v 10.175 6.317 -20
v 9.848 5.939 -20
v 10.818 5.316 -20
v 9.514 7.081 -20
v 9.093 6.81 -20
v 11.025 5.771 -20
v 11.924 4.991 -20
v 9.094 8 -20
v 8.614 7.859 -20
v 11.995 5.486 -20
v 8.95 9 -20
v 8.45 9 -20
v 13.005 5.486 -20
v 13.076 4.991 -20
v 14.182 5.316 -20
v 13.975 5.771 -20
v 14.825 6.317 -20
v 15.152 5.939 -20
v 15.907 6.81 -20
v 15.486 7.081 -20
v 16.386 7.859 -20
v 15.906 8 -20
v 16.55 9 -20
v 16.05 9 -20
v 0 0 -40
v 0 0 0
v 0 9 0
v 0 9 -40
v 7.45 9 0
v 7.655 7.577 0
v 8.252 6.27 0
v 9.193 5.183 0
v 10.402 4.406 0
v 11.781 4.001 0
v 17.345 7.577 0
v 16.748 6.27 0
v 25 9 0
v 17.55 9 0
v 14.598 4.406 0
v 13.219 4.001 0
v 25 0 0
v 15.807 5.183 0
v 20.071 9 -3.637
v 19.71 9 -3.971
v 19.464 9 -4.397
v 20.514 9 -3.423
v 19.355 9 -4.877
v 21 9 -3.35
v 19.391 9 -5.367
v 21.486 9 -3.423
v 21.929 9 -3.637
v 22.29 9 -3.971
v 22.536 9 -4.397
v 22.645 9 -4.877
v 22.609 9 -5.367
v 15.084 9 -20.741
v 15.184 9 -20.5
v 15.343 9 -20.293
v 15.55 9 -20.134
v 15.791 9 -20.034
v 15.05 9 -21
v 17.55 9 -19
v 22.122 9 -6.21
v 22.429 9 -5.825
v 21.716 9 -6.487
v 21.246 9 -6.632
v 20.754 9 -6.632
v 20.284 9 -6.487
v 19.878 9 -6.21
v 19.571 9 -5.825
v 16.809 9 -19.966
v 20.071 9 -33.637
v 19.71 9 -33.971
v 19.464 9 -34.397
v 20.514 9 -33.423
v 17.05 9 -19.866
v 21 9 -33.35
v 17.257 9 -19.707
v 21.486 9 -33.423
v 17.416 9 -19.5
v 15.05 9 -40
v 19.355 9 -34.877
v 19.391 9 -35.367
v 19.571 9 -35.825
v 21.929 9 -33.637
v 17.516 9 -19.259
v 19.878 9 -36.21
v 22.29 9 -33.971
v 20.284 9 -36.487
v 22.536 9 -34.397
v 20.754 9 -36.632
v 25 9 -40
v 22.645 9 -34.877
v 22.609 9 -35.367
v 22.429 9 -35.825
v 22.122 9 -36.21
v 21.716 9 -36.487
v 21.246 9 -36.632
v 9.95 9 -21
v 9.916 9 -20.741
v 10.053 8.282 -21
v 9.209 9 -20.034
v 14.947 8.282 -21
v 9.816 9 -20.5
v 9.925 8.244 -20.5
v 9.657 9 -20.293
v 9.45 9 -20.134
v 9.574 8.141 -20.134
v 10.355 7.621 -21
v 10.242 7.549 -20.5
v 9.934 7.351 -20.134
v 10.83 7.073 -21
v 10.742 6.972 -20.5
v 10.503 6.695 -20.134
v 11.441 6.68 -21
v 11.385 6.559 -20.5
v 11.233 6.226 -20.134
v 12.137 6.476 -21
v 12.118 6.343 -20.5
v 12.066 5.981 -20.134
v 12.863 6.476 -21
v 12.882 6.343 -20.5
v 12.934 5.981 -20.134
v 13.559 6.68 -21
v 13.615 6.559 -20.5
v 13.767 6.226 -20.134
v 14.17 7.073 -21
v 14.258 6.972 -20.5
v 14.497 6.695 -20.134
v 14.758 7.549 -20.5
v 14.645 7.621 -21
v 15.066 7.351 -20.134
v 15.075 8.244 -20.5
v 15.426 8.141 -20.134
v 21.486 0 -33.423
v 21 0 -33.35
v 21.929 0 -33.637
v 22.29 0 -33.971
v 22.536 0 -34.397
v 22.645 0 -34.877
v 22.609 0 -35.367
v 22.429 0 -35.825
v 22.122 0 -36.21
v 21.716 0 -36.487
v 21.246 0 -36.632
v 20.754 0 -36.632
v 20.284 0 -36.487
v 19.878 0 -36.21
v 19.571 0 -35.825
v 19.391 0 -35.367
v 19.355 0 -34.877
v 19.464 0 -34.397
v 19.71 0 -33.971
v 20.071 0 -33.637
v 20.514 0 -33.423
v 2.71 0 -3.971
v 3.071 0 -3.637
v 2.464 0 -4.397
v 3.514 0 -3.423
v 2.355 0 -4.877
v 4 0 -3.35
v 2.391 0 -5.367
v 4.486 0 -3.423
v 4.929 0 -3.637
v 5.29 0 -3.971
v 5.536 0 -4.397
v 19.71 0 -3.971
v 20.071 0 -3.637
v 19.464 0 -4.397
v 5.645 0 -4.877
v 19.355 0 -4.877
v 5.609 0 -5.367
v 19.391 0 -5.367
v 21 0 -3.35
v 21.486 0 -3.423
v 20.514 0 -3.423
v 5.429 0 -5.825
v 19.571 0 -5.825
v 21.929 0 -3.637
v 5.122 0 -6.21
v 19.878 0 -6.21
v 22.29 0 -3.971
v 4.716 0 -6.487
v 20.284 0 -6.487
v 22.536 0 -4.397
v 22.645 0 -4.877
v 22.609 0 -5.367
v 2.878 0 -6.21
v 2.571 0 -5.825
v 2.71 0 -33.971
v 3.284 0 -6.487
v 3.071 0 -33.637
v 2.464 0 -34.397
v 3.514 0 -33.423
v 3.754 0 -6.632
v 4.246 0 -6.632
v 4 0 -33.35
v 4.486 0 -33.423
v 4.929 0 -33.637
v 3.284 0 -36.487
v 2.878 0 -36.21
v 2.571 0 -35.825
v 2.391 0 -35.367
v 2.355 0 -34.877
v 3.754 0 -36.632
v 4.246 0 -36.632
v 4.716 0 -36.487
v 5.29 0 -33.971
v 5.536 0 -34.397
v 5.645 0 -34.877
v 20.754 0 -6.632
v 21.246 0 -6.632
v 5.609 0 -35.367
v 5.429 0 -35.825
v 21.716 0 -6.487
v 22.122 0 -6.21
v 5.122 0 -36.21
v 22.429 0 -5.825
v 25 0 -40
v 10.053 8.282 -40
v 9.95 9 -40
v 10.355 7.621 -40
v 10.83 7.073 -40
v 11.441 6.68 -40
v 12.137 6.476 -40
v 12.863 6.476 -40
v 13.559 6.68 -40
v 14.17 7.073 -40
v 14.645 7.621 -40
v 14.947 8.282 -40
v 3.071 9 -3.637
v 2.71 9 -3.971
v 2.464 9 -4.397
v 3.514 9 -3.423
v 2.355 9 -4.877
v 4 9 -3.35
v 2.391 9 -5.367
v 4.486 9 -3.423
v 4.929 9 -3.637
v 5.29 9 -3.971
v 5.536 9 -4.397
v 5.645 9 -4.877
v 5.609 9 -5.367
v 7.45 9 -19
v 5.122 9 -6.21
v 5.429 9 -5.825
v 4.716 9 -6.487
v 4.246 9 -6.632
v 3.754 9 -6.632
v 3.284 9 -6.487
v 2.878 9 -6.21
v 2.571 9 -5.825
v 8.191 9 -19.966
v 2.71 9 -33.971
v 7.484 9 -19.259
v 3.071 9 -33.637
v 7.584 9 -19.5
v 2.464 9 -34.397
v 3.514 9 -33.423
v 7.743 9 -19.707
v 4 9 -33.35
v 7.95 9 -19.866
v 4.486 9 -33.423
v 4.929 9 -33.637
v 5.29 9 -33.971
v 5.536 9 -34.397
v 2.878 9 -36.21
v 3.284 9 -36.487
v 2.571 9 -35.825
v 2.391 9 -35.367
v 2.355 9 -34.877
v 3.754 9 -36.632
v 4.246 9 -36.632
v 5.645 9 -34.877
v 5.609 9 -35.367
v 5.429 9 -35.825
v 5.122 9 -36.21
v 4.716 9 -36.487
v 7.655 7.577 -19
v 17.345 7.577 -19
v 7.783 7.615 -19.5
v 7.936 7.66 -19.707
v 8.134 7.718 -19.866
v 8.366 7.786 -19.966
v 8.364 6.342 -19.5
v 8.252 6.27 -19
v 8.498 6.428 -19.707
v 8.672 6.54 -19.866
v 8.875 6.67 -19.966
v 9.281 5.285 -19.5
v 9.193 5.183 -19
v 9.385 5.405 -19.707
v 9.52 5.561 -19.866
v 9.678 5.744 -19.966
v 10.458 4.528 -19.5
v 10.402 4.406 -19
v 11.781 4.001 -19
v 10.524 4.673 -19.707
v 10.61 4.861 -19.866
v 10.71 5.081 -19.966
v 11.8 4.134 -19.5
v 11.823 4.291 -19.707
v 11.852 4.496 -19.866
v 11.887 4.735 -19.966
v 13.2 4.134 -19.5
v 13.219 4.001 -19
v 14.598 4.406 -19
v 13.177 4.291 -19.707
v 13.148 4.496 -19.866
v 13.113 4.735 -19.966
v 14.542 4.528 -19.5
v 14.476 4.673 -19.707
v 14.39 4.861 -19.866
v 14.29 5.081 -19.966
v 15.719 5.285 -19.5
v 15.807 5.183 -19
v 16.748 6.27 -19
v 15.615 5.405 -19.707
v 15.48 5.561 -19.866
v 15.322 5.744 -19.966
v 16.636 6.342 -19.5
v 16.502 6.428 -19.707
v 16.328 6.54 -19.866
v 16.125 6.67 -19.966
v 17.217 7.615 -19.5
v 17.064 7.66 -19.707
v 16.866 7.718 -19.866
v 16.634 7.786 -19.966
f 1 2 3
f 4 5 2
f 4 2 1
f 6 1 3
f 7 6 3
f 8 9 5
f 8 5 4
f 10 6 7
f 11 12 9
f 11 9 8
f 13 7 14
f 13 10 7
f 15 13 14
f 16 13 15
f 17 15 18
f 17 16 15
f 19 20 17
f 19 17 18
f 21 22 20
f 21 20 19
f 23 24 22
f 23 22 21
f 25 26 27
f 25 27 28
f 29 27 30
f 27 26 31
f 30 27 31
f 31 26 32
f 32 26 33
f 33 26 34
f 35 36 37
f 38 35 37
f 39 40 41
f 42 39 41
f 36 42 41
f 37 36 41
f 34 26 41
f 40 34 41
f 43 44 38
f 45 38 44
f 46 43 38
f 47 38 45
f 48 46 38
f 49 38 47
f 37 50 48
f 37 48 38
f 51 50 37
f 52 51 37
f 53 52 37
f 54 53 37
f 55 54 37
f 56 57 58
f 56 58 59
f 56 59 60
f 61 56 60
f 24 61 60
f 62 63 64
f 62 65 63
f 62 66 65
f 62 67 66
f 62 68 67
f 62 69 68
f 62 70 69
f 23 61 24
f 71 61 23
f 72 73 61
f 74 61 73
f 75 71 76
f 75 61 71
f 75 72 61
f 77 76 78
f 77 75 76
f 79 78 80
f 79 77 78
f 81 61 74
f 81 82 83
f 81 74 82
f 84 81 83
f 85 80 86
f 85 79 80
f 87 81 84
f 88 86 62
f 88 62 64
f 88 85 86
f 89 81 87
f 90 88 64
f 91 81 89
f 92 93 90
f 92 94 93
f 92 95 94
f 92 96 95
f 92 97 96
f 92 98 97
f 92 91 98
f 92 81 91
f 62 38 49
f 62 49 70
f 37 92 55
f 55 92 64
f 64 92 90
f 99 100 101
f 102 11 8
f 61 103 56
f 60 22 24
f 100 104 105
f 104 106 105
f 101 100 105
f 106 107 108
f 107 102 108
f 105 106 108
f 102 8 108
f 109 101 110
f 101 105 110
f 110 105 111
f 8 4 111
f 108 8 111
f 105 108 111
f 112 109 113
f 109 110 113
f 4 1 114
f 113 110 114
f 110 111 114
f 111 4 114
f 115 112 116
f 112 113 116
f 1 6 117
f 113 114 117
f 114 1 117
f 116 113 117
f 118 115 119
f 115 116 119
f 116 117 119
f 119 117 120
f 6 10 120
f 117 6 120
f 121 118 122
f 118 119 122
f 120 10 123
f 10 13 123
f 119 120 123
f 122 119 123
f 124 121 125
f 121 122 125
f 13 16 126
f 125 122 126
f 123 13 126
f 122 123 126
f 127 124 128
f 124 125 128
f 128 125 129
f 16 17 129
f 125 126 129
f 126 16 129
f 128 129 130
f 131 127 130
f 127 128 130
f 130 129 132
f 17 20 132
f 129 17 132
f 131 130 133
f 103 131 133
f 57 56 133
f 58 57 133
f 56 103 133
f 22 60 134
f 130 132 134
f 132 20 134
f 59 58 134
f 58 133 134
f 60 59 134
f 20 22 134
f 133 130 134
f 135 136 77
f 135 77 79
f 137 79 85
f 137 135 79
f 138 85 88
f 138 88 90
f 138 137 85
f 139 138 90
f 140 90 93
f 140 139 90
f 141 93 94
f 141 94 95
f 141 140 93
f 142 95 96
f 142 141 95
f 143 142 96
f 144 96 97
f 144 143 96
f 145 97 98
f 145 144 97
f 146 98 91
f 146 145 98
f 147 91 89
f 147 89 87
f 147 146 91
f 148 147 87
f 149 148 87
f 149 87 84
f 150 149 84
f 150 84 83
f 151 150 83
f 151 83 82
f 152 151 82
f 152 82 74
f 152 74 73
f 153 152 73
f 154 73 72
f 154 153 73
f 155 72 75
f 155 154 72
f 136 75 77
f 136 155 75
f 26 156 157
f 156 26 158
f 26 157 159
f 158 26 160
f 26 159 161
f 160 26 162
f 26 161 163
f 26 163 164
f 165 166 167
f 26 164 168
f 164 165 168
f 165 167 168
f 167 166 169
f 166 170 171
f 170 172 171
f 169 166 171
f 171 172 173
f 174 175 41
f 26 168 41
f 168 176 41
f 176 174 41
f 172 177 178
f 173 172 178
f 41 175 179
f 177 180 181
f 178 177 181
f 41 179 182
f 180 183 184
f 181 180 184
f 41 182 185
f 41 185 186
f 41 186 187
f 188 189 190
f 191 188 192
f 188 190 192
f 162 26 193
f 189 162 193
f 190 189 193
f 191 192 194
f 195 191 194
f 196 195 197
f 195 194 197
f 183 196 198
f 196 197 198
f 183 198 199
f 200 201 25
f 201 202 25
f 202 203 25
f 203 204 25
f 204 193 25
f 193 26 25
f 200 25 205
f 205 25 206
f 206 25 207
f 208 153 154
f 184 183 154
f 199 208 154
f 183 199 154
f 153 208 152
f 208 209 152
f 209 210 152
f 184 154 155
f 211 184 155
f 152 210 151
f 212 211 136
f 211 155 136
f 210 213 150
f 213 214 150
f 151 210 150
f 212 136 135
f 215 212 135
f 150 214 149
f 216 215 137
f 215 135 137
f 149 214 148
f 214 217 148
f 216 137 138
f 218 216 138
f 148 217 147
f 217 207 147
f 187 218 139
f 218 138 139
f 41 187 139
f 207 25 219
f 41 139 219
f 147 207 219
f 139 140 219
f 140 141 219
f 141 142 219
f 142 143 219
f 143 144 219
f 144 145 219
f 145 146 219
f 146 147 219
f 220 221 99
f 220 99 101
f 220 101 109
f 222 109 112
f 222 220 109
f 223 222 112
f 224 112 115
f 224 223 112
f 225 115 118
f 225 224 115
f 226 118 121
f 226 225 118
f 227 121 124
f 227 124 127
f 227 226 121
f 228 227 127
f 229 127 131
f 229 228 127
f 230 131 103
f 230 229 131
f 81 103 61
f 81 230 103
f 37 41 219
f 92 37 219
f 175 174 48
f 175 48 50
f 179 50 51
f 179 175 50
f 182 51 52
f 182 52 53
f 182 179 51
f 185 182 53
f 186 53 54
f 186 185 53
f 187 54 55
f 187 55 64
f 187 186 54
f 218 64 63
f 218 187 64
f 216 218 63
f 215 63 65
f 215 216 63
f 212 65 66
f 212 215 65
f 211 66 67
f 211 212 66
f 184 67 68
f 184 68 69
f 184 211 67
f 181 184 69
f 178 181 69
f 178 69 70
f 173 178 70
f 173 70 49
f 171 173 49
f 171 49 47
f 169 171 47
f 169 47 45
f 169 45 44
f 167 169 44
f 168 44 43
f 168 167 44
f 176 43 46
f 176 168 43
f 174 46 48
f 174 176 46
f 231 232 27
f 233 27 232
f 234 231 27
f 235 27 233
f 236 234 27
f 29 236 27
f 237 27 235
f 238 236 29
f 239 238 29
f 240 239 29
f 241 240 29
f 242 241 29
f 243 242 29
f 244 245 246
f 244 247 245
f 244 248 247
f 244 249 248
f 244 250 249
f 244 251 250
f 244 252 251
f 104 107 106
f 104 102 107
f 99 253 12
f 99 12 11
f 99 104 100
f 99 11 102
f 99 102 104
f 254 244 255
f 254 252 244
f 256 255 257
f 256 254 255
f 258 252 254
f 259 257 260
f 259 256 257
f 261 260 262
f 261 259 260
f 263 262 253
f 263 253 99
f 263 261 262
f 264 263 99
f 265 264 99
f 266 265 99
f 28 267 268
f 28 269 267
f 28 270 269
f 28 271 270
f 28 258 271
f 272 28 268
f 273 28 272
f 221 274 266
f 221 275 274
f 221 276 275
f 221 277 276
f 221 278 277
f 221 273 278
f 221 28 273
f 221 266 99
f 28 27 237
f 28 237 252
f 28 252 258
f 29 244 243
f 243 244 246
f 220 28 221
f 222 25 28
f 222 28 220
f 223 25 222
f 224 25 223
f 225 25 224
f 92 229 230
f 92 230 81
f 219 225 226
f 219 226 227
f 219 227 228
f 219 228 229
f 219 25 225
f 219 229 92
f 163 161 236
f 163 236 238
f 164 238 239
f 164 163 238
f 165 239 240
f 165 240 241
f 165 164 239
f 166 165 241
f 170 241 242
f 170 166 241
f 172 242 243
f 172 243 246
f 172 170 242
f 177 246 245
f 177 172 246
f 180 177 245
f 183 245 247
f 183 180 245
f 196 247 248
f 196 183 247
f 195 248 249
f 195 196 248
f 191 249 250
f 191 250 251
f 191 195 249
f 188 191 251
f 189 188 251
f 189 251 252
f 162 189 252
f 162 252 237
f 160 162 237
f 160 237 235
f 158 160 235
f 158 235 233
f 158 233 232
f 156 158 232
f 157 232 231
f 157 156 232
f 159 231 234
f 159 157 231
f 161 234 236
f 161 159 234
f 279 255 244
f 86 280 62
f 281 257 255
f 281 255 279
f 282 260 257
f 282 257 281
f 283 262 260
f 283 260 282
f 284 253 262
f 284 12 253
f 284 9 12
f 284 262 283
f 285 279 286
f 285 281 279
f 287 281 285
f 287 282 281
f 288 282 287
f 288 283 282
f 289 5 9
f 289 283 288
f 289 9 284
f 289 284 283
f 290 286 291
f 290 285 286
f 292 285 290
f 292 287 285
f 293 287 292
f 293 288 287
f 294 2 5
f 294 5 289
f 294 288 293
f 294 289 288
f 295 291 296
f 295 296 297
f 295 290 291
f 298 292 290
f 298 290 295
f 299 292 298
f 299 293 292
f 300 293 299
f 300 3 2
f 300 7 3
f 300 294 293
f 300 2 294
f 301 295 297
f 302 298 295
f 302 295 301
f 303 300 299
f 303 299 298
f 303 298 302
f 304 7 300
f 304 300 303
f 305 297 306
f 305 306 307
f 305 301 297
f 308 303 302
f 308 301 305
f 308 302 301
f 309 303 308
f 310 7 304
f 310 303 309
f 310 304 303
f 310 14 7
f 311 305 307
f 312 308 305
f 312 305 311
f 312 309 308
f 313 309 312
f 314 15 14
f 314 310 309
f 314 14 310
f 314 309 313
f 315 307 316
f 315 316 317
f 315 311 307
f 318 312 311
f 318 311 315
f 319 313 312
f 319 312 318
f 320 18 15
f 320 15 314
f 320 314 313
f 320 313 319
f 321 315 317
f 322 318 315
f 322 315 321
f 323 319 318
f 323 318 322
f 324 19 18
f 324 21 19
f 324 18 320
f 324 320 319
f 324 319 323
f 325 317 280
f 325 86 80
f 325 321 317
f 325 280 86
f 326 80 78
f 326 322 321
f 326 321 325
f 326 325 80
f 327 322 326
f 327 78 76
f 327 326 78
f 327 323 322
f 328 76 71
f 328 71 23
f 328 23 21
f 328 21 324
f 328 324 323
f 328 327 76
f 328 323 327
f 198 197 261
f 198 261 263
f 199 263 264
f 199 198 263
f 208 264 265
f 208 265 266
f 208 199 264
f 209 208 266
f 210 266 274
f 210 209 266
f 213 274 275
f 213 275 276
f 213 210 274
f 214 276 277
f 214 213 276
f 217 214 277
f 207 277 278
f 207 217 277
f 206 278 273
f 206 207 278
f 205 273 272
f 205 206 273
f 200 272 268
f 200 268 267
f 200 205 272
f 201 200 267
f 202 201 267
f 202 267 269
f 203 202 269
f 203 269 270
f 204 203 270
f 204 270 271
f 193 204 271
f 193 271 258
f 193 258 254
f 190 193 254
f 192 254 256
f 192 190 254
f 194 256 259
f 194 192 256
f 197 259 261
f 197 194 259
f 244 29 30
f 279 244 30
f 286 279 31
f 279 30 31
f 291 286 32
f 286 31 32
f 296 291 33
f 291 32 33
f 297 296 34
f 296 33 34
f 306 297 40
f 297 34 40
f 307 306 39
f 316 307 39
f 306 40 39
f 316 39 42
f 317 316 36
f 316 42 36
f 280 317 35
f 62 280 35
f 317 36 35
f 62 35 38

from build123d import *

# Parameters (mm, degrees)
SKIZZE1_W                       = 25
SKIZZE1_H                       = 40
SKIZZE1_R                       = 1.65
AUFSATZ_LINEAR_AUSTRAGEN1_DEPTH = 9
SCHNITT_LINEAR_AUSTRAGEN2_DEPTH = 20
SCHNITT_LINEAR_AUSTRAGEN3_DEPTH = 20
VERRUNDUNG1_R                   = 1


with BuildPart() as part:
    # Skizze1 → Aufsatz-Linear austragen1 (new body)
    with BuildSketch(Plane(origin=(0, 0, 0), x_dir=(1, 0, 0), z_dir=(0, 1, 0))):
        with Locations((12.5, 20)):
            Rectangle(SKIZZE1_W, SKIZZE1_H)
        with Locations(Location((4, 5, 0), (0, 0, 270))):
            Circle(SKIZZE1_R, mode=Mode.SUBTRACT)
        with Locations(Location((21, 5, 0), (0, 0, 270))):
            Circle(SKIZZE1_R, mode=Mode.SUBTRACT)
        with Locations(Location((21, 35, 0), (0, 0, 270))):
            Circle(SKIZZE1_R, mode=Mode.SUBTRACT)
        with Locations(Location((4, 35, 0), (0, 0, 270))):
            Circle(SKIZZE1_R, mode=Mode.SUBTRACT)
    extrude(amount=AUFSATZ_LINEAR_AUSTRAGEN1_DEPTH)

    # Skizze3 → Schnitt-Linear austragen2 (cut)
    with BuildSketch(Plane(origin=(0, 0, -40), x_dir=(-1, 0, 0), z_dir=(0, 0, -1))):
        with BuildLine():
            Line((-15.05, 9), (-9.95, 9))
            ThreePointArc((-9.95, 9), (-12.5, 6.45), (-15.05, 9))
        make_face()
    extrude(amount=-SCHNITT_LINEAR_AUSTRAGEN2_DEPTH, mode=Mode.SUBTRACT)

    # Skizze2 → Schnitt-Linear austragen3 (cut)
    with BuildSketch(Plane.XY):
        with BuildLine():
            Line((17.55, 9), (7.45, 9))
            ThreePointArc((7.45, 9), (12.5, 3.95), (17.55, 9))
        make_face()
    extrude(amount=-SCHNITT_LINEAR_AUSTRAGEN3_DEPTH, mode=Mode.SUBTRACT)

    # Verrundung1
    verrundung1_edges = [part.edges().sort_by_distance(p)[0] for p in [
        (12.5, 6.45, -20),
        (12.5, 3.95, -20),
    ]]
    fillet(verrundung1_edges, radius=VERRUNDUNG1_R)


solid = part.part
